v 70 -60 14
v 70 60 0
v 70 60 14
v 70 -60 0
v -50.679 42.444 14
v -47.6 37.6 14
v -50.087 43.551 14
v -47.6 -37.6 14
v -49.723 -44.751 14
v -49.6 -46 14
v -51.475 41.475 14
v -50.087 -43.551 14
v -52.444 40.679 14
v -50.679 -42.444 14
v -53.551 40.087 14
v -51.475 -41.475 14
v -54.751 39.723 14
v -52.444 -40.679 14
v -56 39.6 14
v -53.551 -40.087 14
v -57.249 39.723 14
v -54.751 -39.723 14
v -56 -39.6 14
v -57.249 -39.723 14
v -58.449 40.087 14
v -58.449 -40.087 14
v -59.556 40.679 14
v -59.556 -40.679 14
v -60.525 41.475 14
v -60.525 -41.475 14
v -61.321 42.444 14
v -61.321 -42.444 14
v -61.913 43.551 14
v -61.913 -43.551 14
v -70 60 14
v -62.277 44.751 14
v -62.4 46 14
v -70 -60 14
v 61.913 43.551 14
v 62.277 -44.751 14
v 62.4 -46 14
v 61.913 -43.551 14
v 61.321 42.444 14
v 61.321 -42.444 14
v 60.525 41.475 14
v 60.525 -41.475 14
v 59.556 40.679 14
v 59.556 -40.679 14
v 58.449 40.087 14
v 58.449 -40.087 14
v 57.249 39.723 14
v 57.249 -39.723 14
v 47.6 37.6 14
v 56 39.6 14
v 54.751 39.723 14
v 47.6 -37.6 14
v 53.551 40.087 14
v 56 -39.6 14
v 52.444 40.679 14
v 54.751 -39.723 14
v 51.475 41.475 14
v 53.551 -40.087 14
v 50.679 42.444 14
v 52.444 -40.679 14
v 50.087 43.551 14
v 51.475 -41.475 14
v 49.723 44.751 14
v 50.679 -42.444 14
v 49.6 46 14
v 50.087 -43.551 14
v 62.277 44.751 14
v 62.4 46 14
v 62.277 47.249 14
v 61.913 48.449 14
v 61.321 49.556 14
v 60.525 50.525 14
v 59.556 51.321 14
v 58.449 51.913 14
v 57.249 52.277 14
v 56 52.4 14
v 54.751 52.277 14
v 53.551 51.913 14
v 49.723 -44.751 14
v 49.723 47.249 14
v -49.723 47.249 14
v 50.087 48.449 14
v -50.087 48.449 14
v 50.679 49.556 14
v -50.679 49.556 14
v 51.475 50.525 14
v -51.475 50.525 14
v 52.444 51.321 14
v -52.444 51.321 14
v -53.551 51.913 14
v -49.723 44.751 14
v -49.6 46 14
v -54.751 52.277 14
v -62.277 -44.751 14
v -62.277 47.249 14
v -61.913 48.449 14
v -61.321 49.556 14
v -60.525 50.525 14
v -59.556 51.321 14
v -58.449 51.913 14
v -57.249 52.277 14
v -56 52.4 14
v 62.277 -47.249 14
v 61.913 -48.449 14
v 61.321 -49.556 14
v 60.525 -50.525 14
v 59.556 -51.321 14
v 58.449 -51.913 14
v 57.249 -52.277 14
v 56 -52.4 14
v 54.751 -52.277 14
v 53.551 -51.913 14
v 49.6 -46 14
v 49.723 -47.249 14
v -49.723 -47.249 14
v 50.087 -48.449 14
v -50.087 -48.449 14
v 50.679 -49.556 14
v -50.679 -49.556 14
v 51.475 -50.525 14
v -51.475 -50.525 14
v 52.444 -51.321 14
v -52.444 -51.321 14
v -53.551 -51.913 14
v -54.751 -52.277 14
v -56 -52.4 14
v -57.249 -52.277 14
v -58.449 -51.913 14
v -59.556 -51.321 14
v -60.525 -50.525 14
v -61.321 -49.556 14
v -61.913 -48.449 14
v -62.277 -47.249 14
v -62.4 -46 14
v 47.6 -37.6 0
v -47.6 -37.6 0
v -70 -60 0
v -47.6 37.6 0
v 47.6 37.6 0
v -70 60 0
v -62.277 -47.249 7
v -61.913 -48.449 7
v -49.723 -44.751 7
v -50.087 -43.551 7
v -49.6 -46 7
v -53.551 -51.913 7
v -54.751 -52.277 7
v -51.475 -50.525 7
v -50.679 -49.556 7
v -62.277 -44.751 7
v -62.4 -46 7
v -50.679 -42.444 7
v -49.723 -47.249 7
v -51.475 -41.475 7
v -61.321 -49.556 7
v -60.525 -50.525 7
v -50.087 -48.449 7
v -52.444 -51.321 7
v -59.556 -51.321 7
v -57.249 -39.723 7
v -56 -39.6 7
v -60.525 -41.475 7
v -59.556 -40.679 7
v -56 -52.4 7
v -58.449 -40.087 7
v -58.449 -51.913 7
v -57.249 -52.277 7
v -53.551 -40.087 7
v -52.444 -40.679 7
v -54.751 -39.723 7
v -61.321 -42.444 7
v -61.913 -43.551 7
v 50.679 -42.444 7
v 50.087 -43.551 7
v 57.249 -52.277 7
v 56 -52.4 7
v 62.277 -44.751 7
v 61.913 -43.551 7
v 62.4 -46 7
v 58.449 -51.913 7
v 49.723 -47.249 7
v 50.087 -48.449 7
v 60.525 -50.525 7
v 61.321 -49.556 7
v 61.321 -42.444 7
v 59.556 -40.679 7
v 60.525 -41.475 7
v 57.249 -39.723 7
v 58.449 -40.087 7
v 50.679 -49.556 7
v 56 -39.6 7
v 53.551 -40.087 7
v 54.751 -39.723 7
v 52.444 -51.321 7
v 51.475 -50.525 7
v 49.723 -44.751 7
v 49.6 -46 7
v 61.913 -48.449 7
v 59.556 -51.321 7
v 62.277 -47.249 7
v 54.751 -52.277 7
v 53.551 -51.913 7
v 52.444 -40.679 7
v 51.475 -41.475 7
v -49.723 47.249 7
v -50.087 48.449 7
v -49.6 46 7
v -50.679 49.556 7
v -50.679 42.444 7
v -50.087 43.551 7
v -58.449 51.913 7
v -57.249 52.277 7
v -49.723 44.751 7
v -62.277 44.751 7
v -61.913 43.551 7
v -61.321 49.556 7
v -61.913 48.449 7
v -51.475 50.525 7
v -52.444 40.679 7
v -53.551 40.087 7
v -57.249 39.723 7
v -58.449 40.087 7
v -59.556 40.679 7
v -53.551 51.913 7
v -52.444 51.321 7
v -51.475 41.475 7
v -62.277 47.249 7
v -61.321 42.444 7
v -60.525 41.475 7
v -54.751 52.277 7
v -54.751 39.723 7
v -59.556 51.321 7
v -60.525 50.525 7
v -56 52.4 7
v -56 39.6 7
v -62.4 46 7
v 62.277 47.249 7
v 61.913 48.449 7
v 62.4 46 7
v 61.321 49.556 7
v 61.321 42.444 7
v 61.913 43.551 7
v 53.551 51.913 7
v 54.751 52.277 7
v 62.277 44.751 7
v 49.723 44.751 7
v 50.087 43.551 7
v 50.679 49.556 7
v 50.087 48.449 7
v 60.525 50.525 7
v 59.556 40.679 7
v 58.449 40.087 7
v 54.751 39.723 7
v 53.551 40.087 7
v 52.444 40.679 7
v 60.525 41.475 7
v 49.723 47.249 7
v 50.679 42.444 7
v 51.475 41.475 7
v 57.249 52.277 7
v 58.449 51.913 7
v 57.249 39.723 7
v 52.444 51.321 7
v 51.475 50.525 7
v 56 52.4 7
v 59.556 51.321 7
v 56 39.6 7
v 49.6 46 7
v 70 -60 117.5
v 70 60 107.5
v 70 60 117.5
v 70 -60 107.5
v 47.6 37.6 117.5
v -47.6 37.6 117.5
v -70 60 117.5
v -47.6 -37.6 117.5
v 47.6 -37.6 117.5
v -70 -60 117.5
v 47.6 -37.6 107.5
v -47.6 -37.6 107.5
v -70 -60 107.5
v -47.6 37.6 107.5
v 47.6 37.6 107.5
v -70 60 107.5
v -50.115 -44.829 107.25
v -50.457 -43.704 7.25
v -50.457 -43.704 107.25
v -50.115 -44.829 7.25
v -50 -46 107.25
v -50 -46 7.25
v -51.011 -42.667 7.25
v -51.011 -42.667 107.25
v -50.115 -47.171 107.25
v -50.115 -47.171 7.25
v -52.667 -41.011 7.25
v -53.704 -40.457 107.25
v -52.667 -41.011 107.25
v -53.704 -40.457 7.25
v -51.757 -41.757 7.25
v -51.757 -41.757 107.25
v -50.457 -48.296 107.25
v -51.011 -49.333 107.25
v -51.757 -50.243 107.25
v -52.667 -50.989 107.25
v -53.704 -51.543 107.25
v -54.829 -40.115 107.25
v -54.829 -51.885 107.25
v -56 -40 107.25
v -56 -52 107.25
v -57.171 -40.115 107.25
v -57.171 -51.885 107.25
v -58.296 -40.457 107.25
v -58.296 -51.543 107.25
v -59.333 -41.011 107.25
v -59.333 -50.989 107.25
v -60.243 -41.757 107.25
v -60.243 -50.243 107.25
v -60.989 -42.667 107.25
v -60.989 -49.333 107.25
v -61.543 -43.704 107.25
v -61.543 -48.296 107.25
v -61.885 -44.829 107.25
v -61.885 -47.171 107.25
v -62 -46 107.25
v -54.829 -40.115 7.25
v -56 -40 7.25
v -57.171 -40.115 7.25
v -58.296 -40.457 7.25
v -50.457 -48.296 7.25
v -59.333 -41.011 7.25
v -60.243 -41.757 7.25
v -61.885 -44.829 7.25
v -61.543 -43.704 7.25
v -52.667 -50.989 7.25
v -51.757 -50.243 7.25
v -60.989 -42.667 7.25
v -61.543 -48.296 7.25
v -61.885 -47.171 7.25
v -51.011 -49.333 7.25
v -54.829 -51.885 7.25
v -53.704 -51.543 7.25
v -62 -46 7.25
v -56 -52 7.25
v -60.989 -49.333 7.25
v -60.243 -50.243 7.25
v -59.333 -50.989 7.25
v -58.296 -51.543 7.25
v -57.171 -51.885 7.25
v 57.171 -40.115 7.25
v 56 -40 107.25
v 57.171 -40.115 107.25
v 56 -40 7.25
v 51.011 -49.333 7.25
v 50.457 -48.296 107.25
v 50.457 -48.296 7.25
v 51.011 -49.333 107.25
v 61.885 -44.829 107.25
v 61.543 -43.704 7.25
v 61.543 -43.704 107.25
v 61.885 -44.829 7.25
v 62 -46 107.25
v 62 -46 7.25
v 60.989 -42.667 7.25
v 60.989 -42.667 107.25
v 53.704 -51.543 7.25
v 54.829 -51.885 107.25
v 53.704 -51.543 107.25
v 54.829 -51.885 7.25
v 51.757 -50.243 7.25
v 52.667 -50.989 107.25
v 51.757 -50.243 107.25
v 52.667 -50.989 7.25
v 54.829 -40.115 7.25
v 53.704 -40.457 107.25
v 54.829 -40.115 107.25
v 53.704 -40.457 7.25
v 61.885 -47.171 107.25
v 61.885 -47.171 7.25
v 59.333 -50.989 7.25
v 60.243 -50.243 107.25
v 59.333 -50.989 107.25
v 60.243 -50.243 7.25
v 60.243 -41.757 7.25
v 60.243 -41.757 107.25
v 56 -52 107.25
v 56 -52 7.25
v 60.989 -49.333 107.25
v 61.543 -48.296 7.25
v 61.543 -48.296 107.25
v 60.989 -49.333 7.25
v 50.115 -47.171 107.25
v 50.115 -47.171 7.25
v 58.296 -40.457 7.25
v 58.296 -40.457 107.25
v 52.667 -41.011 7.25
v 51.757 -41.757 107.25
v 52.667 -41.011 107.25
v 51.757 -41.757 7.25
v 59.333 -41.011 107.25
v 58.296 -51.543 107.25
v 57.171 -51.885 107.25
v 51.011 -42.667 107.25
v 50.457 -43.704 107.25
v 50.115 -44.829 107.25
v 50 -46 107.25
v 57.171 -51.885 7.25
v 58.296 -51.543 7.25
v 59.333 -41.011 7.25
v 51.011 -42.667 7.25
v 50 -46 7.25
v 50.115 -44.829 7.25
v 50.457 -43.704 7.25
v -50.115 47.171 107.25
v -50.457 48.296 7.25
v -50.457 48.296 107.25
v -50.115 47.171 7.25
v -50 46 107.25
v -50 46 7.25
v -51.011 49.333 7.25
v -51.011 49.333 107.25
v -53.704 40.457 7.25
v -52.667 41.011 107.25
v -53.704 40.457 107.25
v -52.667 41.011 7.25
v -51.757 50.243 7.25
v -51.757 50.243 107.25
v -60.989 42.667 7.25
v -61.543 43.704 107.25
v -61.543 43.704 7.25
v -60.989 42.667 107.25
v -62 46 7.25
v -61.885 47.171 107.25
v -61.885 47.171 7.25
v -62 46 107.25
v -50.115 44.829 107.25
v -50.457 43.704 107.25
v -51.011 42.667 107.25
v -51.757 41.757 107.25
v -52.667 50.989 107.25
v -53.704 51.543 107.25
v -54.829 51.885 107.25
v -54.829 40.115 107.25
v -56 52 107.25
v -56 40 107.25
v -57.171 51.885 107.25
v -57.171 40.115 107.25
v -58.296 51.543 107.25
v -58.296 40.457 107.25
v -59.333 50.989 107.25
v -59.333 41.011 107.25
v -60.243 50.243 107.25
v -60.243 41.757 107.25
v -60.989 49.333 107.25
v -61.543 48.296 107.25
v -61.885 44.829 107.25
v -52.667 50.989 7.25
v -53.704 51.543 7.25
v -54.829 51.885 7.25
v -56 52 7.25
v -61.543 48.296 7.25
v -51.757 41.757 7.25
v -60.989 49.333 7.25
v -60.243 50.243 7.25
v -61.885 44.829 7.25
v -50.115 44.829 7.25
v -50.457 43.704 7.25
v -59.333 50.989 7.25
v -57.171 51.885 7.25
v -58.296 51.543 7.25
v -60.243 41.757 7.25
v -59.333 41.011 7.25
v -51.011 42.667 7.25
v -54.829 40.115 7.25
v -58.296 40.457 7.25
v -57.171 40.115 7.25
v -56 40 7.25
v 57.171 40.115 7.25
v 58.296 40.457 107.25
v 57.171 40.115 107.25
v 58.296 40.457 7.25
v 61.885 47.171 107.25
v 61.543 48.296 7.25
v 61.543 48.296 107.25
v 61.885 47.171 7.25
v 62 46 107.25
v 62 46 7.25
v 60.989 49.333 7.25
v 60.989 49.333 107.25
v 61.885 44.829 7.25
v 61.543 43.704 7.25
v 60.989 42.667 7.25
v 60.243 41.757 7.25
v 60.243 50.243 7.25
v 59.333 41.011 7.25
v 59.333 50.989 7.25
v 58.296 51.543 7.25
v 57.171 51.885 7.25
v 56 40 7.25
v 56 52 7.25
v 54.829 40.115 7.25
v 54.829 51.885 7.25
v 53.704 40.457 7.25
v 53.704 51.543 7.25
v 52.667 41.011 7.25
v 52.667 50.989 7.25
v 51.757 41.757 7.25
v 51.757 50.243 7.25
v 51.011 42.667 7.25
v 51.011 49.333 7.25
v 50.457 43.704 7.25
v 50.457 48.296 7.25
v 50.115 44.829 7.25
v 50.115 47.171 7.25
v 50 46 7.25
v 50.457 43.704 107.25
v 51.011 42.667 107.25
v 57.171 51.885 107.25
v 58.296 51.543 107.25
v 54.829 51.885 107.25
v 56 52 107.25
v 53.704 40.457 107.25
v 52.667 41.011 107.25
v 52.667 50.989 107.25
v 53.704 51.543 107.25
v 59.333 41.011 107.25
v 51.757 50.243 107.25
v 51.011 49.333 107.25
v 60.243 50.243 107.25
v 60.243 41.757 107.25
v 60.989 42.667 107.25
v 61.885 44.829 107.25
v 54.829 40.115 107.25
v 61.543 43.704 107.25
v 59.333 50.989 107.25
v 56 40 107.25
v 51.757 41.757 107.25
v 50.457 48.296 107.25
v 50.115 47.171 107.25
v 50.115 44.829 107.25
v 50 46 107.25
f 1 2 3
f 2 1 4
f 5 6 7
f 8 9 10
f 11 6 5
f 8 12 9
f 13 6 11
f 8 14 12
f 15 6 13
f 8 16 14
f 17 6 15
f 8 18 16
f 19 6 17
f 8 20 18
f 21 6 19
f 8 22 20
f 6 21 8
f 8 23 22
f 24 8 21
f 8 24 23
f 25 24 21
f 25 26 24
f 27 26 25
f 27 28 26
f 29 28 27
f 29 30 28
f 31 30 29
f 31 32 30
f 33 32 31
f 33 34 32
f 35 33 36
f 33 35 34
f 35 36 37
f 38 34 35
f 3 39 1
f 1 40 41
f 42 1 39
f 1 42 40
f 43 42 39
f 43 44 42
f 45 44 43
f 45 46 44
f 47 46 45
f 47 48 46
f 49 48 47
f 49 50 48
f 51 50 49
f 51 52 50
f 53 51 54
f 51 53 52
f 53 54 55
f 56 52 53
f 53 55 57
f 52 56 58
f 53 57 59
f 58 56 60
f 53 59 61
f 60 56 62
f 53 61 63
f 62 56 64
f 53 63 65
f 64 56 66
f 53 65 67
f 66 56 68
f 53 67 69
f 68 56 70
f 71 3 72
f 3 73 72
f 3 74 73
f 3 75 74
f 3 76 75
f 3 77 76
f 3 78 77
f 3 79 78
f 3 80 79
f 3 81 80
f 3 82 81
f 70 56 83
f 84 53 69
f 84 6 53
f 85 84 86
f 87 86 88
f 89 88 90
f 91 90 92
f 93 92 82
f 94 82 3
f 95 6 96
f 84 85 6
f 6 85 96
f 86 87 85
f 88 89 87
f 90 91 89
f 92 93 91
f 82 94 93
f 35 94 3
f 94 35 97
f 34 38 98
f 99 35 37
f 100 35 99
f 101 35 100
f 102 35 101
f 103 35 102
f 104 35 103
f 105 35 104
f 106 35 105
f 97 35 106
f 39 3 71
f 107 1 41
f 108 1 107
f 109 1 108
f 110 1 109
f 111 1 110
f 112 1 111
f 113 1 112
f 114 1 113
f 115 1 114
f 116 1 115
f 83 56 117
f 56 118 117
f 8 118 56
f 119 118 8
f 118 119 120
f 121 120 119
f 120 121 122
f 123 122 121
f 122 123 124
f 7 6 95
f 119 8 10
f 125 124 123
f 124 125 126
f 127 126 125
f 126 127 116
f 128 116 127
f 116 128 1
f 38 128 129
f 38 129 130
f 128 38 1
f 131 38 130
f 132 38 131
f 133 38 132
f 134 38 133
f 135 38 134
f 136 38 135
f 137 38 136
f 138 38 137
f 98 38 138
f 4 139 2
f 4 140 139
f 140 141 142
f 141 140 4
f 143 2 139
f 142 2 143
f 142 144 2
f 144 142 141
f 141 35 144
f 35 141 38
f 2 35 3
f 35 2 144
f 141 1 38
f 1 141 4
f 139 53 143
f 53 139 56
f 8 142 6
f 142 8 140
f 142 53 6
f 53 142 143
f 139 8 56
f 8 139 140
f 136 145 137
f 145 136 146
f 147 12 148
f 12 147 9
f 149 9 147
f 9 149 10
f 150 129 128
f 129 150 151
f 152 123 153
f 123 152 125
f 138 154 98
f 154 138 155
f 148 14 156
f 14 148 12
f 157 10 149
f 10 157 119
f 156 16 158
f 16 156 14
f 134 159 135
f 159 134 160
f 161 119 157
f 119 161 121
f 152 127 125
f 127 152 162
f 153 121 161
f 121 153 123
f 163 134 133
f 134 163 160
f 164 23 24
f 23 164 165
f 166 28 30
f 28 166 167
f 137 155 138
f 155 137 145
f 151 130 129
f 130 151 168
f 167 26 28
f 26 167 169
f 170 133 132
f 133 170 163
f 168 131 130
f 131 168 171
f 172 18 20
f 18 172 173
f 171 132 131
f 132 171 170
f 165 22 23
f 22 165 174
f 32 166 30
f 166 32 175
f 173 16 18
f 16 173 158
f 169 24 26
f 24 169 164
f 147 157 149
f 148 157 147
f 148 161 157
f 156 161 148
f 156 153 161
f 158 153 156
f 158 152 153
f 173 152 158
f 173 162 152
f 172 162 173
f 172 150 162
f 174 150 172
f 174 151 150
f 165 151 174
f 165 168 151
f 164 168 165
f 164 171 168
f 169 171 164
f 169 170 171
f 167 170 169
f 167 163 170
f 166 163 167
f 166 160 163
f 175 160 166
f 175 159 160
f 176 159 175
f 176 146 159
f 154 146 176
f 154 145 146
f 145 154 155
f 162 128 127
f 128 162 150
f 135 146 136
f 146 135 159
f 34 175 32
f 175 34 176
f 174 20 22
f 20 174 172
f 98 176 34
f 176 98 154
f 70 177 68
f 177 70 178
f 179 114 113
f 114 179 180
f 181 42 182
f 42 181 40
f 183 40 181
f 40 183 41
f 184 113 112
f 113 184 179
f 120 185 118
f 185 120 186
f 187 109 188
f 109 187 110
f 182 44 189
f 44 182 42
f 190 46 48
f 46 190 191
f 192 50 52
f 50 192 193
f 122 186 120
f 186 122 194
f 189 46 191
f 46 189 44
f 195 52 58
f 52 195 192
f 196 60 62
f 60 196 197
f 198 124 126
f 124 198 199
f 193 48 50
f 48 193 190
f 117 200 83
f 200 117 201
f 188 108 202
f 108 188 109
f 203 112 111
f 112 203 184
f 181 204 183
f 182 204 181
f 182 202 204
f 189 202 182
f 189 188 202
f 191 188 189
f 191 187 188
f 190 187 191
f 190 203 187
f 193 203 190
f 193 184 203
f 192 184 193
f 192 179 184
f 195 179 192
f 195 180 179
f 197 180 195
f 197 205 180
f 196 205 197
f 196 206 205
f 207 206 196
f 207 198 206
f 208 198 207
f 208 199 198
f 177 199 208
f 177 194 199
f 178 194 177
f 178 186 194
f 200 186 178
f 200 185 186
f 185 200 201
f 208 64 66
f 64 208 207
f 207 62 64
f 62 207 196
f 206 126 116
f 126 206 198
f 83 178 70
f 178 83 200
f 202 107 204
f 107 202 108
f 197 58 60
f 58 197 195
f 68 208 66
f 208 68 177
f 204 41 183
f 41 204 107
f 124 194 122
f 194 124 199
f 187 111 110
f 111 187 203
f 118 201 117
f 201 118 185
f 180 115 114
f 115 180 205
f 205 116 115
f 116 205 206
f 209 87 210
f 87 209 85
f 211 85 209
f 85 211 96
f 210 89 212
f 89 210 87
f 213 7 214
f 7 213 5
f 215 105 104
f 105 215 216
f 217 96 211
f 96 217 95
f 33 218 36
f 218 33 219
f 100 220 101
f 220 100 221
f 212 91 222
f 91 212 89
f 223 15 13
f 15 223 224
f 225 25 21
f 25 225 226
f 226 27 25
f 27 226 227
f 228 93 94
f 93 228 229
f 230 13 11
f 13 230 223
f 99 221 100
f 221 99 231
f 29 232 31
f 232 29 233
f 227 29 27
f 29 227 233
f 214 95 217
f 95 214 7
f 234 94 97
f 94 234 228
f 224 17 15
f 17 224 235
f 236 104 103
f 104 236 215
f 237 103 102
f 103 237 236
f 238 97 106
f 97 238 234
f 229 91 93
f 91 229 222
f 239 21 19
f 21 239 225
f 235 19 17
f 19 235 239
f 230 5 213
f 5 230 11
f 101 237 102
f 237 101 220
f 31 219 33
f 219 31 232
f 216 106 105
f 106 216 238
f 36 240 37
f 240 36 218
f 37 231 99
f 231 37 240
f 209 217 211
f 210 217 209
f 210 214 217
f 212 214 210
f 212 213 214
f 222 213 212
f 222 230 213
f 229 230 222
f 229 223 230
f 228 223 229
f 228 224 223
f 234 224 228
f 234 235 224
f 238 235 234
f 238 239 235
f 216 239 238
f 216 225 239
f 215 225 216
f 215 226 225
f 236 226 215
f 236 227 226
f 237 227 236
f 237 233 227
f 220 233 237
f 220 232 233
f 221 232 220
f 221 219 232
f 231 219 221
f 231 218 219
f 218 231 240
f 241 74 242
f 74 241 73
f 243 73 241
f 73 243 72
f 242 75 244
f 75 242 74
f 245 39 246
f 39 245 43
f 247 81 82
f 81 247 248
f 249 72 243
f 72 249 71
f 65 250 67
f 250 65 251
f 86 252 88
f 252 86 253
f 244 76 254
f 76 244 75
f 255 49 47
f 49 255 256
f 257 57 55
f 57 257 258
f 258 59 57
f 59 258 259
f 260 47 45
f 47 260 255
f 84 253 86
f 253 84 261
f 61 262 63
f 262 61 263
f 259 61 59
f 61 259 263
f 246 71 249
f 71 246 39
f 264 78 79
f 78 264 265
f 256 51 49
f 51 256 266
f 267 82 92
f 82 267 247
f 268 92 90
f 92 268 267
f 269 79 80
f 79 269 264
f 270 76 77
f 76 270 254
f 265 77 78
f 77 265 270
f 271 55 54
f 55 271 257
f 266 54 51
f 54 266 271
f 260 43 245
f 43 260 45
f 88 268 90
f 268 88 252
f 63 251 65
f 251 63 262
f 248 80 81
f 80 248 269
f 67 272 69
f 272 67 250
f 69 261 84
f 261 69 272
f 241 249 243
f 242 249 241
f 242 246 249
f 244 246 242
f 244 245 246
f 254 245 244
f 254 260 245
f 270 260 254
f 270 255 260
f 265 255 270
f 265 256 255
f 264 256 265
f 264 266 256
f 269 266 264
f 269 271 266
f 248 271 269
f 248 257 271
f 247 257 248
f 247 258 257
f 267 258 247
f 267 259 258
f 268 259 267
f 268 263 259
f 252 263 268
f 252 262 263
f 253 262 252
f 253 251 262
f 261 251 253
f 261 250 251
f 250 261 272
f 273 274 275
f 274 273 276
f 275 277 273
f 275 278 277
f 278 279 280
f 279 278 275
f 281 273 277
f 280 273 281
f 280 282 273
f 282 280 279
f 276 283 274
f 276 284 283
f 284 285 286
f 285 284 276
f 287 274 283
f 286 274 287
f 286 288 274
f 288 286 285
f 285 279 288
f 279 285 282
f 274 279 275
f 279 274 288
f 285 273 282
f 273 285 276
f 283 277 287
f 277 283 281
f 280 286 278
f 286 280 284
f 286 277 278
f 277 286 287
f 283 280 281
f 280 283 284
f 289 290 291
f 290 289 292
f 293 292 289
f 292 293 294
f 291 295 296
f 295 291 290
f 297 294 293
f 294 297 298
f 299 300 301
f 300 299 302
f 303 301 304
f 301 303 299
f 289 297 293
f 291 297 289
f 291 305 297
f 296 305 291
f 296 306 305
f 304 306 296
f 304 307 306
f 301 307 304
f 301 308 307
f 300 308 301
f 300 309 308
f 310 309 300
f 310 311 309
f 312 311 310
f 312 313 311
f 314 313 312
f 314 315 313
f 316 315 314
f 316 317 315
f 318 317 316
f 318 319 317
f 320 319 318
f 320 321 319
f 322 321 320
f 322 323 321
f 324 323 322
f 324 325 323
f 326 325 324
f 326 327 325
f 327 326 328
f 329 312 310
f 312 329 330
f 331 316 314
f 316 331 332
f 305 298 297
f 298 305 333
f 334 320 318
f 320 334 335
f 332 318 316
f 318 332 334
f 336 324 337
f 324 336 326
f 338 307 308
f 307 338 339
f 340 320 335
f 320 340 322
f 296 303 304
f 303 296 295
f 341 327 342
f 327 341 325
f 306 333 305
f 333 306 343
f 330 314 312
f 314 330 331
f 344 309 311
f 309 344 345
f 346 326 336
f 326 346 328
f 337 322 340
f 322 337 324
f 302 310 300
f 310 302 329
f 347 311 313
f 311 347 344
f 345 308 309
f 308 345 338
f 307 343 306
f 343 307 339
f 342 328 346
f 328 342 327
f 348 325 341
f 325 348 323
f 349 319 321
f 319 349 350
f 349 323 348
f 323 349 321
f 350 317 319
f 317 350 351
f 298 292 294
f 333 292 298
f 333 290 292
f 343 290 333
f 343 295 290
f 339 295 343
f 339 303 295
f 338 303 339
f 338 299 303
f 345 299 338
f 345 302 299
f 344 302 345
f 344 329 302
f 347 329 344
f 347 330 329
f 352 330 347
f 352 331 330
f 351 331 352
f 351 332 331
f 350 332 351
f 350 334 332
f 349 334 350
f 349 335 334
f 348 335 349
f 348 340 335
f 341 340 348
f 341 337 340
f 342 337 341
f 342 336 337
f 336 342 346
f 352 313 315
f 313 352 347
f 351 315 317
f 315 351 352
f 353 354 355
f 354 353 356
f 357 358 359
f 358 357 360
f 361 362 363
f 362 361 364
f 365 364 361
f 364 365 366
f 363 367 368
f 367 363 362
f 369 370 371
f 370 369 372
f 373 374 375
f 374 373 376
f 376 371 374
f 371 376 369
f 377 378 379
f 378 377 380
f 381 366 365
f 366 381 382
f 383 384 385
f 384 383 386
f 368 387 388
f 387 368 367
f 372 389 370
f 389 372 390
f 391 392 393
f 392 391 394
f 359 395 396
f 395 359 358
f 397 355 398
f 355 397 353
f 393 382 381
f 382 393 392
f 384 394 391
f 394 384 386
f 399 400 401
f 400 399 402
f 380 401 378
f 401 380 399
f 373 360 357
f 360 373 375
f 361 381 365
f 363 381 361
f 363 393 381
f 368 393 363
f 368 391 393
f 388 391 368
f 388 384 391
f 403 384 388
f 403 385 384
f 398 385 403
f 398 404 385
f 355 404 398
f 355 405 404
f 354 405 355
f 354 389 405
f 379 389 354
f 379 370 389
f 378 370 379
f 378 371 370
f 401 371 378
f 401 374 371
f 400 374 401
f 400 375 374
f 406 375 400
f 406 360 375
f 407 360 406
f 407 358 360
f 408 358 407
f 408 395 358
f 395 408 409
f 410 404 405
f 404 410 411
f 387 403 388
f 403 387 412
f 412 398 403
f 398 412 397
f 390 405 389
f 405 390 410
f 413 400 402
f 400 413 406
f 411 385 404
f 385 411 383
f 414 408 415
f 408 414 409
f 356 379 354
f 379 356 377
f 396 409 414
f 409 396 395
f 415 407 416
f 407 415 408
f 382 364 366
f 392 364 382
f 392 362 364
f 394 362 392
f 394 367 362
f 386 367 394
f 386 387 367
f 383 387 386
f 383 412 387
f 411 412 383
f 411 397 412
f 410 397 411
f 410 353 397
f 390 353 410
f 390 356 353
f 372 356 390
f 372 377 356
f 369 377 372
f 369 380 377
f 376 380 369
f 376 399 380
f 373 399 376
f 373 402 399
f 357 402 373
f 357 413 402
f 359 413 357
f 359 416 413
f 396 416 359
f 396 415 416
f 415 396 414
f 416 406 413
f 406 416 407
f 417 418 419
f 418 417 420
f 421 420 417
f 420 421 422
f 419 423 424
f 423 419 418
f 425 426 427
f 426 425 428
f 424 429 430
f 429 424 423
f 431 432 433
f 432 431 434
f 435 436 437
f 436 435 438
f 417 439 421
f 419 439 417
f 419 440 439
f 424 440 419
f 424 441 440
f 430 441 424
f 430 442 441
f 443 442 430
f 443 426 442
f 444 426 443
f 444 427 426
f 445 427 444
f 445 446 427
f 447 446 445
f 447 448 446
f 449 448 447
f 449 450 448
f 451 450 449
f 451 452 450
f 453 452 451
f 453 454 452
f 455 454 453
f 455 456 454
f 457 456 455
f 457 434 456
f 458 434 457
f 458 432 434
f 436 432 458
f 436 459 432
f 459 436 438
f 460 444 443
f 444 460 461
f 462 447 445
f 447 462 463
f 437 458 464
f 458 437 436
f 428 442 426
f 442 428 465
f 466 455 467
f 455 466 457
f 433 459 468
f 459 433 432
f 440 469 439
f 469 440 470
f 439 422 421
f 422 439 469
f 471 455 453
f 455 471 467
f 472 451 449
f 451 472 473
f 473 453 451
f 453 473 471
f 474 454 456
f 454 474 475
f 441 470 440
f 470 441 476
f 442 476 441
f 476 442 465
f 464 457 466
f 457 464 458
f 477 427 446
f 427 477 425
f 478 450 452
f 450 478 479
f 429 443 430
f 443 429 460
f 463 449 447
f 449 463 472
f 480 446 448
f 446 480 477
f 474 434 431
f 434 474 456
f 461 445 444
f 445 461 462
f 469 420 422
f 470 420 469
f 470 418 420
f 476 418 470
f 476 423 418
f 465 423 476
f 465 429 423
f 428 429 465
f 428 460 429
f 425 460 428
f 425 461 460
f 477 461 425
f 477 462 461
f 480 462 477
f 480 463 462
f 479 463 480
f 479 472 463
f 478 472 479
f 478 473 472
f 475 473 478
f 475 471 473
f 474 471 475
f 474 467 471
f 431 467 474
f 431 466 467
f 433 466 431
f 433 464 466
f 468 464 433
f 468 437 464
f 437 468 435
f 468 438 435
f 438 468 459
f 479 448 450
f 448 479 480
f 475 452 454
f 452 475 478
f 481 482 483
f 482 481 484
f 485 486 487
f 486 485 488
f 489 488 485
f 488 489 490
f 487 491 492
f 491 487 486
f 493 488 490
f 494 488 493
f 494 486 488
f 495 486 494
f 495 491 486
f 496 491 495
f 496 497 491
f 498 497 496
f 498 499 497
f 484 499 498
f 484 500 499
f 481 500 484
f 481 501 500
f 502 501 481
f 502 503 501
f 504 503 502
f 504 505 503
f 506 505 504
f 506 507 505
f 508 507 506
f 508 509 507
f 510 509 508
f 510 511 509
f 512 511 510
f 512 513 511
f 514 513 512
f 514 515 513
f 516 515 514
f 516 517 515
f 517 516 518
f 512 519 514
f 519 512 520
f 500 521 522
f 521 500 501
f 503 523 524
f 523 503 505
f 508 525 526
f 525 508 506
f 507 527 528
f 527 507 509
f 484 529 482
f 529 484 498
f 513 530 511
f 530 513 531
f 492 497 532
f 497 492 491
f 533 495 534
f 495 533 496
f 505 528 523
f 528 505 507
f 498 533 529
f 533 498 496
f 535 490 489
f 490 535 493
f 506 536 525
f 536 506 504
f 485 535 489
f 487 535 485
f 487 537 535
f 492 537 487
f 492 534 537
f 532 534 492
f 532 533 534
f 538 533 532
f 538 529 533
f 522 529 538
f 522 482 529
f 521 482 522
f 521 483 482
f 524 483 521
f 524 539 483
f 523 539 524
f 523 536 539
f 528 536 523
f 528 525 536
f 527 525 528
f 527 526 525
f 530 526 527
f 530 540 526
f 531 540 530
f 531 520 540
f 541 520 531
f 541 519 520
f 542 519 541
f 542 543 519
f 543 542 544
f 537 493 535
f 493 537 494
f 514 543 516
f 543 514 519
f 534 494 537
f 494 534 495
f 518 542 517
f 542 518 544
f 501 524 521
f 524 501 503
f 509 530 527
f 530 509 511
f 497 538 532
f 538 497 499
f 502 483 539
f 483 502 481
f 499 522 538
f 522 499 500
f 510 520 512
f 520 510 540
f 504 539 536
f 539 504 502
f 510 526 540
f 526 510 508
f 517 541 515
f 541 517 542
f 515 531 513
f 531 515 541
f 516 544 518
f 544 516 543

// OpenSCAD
$fn = 32;

// ------------------------------------------------------------------------
// Frame cube: base 140 x 120 mm, posts 100 mm tall
// Every part is its own module, assembly() places every instance.
// ------------------------------------------------------------------------

// --- part 1 ---
module base_frame() {
  difference() {
    translate([-70, -60, 0]) cube([140, 120, 14]);
    translate([-47.6, -37.6, -1]) cube([95.2, 75.2, 16]);
    translate([-56, -46, 7]) cylinder(h = 8, d = 12.8);
    translate([56, -46, 7]) cylinder(h = 8, d = 12.8);
    translate([-56, 46, 7]) cylinder(h = 8, d = 12.8);
    translate([56, 46, 7]) cylinder(h = 8, d = 12.8);
  }
}

// --- part 2 ---
module corner_post() {
  cylinder(h = 100, d = 12);
}

// --- part 3 ---
module top_frame() {
  difference() {
    translate([-70, -60, 0]) cube([140, 120, 10]);
    translate([-47.6, -37.6, -1]) cube([95.2, 75.2, 12]);
  }
}

// --- assembly ---
module assembly() {
  color([0.80, 0.24, 0.20]) translate([0, 0, 0]) rotate([0, 0, 0]) base_frame();
  color([0.20, 0.45, 0.75]) translate([-56, -46, 7.25]) rotate([0, 0, 0]) corner_post();
  color([0.25, 0.62, 0.32]) translate([56, -46, 7.25]) rotate([0, 0, 0]) corner_post();
  color([0.92, 0.70, 0.18]) translate([-56, 46, 7.25]) rotate([0, 0, 0]) corner_post();
  color([0.58, 0.35, 0.70]) translate([56, 46, 7.25]) rotate([0, 0, 0]) corner_post();
  color([0.16, 0.66, 0.66]) translate([0, 0, 107.5]) rotate([0, 0, 0]) top_frame();
}

assembly();
